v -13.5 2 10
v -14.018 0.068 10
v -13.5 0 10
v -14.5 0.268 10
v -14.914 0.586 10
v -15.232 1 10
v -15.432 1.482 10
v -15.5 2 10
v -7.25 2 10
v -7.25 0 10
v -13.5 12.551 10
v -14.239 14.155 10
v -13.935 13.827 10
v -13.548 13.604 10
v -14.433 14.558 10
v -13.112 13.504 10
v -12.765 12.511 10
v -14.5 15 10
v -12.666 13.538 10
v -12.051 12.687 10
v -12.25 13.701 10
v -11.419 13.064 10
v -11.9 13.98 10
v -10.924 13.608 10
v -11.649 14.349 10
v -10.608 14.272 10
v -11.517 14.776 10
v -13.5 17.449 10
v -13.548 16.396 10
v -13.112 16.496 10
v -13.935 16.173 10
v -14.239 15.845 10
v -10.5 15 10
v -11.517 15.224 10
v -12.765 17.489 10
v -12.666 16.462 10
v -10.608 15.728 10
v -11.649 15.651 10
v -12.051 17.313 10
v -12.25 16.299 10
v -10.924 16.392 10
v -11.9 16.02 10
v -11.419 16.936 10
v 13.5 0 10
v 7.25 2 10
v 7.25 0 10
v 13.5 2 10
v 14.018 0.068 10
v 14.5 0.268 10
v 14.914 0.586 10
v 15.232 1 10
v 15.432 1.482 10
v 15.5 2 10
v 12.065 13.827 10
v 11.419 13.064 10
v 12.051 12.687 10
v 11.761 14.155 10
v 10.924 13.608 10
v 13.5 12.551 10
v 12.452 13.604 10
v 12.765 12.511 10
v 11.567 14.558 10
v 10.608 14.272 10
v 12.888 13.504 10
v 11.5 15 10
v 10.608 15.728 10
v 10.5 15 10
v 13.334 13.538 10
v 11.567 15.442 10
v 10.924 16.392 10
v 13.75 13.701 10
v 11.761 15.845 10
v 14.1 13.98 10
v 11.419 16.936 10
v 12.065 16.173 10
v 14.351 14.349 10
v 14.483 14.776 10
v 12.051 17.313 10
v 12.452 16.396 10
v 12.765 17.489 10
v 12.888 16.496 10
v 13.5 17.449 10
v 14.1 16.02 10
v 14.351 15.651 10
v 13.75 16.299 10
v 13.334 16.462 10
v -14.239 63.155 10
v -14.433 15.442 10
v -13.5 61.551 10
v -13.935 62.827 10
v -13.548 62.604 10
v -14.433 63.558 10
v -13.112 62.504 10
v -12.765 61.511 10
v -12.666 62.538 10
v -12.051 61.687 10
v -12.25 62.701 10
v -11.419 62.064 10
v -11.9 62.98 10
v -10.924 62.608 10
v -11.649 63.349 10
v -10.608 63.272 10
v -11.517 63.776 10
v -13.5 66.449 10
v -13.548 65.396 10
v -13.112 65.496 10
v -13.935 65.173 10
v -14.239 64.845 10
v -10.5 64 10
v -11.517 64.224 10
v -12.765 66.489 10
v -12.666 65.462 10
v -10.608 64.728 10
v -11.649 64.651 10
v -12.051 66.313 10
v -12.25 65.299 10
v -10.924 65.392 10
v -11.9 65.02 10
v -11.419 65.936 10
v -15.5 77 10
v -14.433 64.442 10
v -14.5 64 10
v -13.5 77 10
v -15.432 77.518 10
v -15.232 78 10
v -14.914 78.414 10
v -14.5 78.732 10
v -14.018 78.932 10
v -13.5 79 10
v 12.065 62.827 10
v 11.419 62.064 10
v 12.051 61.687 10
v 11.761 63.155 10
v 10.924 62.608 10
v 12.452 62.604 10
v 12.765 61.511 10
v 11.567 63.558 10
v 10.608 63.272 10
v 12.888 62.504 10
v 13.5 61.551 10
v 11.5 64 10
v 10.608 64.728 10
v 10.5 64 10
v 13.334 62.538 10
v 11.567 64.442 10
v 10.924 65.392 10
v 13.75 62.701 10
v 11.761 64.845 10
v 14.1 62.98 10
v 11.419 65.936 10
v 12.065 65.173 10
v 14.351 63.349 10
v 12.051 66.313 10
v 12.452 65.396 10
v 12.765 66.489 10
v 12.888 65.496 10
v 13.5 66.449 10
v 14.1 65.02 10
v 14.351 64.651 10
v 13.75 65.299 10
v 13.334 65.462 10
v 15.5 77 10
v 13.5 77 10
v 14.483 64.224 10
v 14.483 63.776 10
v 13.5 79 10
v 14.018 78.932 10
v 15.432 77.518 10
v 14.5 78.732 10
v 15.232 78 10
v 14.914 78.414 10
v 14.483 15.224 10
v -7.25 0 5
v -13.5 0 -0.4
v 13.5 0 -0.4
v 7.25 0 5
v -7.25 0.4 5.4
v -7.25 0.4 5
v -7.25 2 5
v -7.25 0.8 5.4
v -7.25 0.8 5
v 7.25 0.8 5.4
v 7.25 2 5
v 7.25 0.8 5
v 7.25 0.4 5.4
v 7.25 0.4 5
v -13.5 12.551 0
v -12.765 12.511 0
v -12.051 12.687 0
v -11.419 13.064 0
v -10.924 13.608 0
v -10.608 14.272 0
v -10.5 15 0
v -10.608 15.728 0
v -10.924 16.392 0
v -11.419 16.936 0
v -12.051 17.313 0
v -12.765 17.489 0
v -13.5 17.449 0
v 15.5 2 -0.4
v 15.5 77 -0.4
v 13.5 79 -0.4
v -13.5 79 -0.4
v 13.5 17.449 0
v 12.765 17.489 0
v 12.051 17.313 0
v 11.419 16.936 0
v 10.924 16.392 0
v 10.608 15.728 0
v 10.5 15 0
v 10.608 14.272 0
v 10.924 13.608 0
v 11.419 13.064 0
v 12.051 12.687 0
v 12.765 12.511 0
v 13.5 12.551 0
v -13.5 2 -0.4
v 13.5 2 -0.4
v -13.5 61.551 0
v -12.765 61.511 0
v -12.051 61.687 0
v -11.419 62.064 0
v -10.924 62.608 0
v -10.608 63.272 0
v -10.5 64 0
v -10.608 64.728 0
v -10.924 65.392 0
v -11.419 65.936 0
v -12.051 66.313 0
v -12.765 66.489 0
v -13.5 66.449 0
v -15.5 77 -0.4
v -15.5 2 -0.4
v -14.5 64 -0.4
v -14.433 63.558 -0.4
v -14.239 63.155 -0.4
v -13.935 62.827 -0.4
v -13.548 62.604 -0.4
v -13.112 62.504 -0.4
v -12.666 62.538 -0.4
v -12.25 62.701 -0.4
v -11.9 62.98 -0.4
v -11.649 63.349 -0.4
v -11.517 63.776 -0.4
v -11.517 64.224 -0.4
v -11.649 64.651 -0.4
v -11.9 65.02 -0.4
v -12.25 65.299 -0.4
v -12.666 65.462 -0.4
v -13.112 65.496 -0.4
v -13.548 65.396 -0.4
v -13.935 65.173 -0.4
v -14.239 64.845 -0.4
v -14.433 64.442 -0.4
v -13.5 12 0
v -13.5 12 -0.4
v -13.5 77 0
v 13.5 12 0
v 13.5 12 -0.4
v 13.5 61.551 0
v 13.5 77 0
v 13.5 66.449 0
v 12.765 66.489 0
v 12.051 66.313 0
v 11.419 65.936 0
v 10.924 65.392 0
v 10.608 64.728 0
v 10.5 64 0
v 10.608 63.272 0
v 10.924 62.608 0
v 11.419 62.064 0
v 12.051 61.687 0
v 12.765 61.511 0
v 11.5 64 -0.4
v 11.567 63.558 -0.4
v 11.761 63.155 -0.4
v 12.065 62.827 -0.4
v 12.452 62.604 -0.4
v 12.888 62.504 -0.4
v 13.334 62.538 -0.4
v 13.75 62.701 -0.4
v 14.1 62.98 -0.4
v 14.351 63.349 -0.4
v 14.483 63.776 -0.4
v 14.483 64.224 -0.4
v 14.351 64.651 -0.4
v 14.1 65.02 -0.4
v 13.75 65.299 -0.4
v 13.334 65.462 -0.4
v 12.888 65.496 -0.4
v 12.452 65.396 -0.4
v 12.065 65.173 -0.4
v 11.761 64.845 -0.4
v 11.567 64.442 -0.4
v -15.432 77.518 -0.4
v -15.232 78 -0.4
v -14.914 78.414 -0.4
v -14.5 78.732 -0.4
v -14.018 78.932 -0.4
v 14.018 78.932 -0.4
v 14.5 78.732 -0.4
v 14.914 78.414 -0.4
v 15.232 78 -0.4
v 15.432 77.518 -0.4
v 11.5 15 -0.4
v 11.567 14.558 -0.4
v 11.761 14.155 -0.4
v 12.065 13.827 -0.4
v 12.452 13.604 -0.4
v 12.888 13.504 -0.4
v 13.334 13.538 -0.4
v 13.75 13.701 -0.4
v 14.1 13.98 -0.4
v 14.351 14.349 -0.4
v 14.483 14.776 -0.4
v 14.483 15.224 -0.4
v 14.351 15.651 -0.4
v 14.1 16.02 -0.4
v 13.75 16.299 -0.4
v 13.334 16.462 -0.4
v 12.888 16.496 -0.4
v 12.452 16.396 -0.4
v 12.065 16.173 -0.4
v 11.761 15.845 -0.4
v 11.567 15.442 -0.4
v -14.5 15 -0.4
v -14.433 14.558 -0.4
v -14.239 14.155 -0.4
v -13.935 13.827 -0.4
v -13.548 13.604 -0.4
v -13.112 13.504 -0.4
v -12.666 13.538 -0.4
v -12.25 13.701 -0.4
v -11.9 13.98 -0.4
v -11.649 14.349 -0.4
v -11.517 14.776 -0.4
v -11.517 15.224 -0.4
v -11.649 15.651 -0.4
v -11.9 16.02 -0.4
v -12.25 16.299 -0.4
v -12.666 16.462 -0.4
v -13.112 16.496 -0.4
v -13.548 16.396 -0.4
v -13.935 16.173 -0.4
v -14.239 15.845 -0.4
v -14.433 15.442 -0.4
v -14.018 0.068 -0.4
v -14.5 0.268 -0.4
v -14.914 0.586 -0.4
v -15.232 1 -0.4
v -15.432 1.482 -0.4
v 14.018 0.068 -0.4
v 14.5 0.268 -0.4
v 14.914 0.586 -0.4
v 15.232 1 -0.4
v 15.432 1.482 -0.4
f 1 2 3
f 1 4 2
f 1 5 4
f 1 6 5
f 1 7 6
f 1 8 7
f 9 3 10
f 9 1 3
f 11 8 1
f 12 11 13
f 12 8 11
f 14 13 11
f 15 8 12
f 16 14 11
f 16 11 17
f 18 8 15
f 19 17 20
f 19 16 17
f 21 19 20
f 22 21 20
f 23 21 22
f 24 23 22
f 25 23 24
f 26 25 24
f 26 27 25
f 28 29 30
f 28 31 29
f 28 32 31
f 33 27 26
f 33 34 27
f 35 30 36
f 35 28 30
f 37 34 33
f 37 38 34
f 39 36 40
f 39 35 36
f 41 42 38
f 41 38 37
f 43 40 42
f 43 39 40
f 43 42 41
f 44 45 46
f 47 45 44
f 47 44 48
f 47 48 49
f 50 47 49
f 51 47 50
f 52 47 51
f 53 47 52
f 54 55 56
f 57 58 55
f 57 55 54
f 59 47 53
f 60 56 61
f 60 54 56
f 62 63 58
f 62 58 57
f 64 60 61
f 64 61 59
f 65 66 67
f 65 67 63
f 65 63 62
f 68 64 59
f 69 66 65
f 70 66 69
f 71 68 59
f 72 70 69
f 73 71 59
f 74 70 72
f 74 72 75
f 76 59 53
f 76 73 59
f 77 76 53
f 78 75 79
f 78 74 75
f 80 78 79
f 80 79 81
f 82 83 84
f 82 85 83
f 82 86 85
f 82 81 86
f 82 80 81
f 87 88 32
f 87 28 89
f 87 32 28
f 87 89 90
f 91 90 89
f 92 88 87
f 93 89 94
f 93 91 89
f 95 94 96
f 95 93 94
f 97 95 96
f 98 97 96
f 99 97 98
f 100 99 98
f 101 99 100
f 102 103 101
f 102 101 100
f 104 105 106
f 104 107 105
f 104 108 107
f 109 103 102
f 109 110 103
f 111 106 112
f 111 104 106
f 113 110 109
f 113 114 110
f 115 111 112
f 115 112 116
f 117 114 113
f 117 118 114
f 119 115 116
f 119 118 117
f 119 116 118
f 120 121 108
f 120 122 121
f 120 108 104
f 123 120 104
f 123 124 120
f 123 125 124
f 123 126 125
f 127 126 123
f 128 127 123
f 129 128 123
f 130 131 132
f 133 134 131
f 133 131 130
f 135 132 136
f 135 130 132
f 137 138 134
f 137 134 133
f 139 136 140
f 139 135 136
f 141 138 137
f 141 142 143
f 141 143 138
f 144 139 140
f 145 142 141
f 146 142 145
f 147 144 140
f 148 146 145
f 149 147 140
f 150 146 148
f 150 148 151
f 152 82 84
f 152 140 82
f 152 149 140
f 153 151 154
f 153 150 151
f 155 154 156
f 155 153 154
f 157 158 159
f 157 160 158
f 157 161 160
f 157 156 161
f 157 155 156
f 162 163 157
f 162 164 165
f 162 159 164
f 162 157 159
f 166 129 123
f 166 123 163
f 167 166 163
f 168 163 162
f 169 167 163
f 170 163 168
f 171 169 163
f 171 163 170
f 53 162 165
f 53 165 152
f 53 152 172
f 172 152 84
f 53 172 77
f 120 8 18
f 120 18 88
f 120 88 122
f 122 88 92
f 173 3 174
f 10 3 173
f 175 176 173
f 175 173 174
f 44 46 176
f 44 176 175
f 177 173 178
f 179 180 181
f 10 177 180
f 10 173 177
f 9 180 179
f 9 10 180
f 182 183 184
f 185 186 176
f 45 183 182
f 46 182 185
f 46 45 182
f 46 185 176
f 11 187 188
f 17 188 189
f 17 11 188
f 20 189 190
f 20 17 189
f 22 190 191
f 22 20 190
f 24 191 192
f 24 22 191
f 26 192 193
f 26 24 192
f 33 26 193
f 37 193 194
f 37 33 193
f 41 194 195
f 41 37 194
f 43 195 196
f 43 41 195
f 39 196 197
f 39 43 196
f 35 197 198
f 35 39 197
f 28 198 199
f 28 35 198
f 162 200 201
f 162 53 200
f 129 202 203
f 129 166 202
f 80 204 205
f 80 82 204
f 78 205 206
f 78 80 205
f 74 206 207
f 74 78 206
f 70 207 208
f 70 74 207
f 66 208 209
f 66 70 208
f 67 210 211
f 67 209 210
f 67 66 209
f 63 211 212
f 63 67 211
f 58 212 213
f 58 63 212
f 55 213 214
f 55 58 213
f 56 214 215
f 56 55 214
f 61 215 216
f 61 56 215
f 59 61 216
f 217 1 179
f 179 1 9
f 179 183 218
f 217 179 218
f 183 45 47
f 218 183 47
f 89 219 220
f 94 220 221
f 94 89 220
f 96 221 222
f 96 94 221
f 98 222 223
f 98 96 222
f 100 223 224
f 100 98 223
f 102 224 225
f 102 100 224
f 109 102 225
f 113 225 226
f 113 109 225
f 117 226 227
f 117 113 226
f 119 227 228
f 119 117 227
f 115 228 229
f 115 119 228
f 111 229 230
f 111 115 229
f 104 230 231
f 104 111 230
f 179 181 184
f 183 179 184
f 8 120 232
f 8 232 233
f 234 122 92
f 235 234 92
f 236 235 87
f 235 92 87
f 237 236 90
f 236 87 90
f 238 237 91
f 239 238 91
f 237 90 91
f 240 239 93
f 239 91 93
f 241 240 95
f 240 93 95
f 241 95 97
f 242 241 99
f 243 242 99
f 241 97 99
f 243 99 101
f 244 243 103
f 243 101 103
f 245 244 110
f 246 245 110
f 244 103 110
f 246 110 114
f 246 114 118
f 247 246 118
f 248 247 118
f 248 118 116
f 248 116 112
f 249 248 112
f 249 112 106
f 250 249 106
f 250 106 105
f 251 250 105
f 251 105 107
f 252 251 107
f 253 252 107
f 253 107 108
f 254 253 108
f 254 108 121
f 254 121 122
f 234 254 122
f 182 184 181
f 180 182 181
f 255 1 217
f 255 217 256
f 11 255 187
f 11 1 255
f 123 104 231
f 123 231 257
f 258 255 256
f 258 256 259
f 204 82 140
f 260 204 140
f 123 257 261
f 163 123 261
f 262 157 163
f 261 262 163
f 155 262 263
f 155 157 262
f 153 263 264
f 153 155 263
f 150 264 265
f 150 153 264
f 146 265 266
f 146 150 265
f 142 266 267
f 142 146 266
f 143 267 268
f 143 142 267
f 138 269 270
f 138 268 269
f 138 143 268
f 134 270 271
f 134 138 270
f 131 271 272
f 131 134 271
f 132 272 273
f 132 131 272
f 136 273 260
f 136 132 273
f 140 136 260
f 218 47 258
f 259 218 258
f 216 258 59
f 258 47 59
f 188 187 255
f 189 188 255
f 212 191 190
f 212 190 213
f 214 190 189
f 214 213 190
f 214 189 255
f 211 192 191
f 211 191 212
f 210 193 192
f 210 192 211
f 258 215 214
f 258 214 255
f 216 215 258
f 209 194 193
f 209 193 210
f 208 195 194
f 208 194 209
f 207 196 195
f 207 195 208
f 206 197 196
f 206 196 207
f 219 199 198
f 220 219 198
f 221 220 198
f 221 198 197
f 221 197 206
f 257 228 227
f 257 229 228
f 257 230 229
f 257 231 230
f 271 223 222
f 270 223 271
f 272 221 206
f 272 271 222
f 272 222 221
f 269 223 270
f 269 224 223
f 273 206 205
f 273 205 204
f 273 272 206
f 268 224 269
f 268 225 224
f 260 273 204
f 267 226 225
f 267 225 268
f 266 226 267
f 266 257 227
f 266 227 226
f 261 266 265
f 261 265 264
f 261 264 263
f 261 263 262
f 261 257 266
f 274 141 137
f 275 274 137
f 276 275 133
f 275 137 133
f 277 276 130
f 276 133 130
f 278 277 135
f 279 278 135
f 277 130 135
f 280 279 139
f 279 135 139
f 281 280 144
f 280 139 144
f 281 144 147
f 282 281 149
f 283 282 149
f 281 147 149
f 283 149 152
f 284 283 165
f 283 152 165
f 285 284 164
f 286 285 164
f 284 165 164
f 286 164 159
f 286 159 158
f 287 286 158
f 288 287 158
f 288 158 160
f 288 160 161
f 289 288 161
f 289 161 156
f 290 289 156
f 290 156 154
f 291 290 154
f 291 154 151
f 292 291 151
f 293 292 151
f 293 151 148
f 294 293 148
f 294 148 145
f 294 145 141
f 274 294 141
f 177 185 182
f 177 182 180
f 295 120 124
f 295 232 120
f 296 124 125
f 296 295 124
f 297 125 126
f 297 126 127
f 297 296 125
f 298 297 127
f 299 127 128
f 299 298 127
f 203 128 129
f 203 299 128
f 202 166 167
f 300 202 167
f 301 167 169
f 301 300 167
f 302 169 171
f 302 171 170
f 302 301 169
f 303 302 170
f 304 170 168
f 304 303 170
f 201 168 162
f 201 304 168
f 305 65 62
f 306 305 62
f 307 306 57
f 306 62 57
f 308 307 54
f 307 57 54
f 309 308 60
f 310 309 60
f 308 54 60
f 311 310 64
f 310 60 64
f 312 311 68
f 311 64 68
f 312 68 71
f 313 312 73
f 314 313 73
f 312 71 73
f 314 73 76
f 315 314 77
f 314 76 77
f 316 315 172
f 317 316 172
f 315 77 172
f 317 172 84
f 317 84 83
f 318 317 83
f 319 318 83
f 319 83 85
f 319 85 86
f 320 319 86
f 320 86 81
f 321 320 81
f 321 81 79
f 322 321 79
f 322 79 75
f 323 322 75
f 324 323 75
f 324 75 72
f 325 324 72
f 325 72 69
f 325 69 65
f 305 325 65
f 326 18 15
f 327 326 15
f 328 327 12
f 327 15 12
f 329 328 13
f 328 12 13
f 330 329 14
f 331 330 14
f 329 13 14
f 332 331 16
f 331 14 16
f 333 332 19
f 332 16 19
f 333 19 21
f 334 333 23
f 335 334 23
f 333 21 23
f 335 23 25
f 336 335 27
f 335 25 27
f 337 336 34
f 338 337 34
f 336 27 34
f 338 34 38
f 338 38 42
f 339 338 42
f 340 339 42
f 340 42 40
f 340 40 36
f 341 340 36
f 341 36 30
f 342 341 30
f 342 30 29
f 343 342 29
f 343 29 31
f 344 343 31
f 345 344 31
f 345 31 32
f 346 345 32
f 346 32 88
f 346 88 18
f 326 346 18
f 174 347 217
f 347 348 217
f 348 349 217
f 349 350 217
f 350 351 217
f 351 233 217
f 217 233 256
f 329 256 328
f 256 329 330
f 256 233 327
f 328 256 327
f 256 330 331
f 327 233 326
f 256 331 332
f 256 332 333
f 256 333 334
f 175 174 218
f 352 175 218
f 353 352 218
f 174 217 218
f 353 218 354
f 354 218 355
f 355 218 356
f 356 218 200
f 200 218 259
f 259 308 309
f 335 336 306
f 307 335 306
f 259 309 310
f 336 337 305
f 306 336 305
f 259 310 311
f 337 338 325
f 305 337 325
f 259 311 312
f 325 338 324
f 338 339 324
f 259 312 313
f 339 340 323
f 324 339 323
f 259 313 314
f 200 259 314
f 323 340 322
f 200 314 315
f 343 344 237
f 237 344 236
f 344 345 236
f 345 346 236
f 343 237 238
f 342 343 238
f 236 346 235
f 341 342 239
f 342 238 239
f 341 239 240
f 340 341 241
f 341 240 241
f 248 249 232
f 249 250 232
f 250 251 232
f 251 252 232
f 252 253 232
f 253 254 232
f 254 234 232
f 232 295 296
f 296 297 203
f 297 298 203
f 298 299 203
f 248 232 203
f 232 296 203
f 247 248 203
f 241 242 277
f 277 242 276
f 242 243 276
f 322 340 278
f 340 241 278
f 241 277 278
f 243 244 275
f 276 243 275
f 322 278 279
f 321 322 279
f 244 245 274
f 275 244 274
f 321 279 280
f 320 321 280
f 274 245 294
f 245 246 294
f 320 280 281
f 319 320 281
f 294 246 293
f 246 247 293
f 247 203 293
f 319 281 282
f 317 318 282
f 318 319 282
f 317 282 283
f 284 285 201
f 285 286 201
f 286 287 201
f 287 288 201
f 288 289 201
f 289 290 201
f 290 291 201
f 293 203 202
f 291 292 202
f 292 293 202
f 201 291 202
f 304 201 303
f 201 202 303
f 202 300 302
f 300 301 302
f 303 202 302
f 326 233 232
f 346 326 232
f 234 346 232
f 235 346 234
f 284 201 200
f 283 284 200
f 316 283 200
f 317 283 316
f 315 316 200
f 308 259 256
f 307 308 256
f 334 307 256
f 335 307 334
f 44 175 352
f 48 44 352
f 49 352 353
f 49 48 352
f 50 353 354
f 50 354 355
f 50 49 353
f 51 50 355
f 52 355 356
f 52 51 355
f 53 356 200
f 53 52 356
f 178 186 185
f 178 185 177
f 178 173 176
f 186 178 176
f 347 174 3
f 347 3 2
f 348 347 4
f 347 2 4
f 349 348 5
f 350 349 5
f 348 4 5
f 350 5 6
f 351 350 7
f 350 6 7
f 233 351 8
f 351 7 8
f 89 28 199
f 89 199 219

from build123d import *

# Parameters (mm, degrees)
SKETCH_W        = 27
SKETCH_H        = 75
PAD_DEPTH       = 10
SKETCH001_W     = 27
SKETCH001_H     = 10
PAD001_DEPTH    = 0.4
POCKET_DEPTH    = 5
SKETCH011_W     = 14.5
SKETCH011_H     = 0.4
PAD004_DEPTH    = 0.4
SKETCH012_R     = 2.5
PAD005_DEPTH    = 10.4
SKETCH009_R     = 1.5
POCKET001_DEPTH = 10.401
FILLET_R        = 2


with BuildPart() as part:
    # Sketch → Pad (new body)
    with BuildSketch(Plane.XY):
        Polygon((0, 0), (15.5, 0), (15.5, 39.5), (15.5, 79), (0, 79), (-15.5, 79), (-15.5, 39.5), (-15.5, 0), align=None)
        with Locations((0, 39.5)):
            Rectangle(SKETCH_W, SKETCH_H, mode=Mode.SUBTRACT)
    extrude(amount=PAD_DEPTH)

    # Sketch001 → Pad001 (join)
    with BuildSketch(Plane.XY):
        Polygon((-15.5, 79), (-15.5, 39.5), (-15.5, 0), (0, 0), (15.5, 0), (15.5, 39.5), (15.5, 79), (0, 79), align=None)
        with Locations((0, 7)):
            Rectangle(SKETCH001_W, SKETCH001_H, mode=Mode.SUBTRACT)
    extrude(amount=-PAD001_DEPTH)

    # Sketch010 (on DatumPlane) → Pocket (cut)
    with BuildSketch(Plane(origin=(0, 0, 10), x_dir=(-1, 0, 0), z_dir=(0, 0, 1))):
        Polygon((0, 0), (7.25, 0), (7.25, -2), (-7.25, -2), (-7.25, 0), align=None)
    extrude(amount=-POCKET_DEPTH, mode=Mode.SUBTRACT)

    # Sketch011 (on DatumPlane) → Pad004 (join)
    with BuildSketch(Plane(origin=(0, 0, 5), x_dir=(-1, 0, 0), z_dir=(0, 0, 1))):
        with Locations((0, -0.6)):
            Rectangle(SKETCH011_W, SKETCH011_H)
    extrude(amount=PAD004_DEPTH)

    # Sketch012 (on DatumPlane) → Pad005 (join)
    with BuildSketch(Plane(origin=(-15.5, 39.5, 10), x_dir=(-1, 0, 0), z_dir=(0, 0, 1))):
        with Locations((-2.5, 24.5)):
            Circle(SKETCH012_R)
        with Locations((-28.5, 24.5)):
            Circle(SKETCH012_R)
        with Locations((-28.5, -24.5)):
            Circle(SKETCH012_R)
        with Locations((-2.5, -24.5)):
            Circle(SKETCH012_R)
    extrude(amount=-PAD005_DEPTH)

    # Sketch009 (on DatumPlane) → Pocket001 (cut, through all)
    with BuildSketch(Plane(origin=(-15.5, 39.5, 10), x_dir=(-1, 0, 0), z_dir=(0, 0, 1))):
        with Locations((-28.5, 24.5)):
            Circle(SKETCH009_R)
        with Locations((-2.5, 24.5)):
            Circle(SKETCH009_R)
        with Locations((-28.5, -24.5)):
            Circle(SKETCH009_R)
        with Locations((-2.5, -24.5)):
            Circle(SKETCH009_R)
    extrude(amount=-POCKET001_DEPTH, mode=Mode.SUBTRACT)

    # Fillet
    fillet_edges = [part.edges().sort_by_distance(p)[0] for p in [
        (-15.5, 0, 5),
        (15.5, 0, 5),
        (15.5, 79, 5),
        (-15.5, 79, 5),
    ]]
    fillet(fillet_edges, radius=FILLET_R)


solid = part.part
